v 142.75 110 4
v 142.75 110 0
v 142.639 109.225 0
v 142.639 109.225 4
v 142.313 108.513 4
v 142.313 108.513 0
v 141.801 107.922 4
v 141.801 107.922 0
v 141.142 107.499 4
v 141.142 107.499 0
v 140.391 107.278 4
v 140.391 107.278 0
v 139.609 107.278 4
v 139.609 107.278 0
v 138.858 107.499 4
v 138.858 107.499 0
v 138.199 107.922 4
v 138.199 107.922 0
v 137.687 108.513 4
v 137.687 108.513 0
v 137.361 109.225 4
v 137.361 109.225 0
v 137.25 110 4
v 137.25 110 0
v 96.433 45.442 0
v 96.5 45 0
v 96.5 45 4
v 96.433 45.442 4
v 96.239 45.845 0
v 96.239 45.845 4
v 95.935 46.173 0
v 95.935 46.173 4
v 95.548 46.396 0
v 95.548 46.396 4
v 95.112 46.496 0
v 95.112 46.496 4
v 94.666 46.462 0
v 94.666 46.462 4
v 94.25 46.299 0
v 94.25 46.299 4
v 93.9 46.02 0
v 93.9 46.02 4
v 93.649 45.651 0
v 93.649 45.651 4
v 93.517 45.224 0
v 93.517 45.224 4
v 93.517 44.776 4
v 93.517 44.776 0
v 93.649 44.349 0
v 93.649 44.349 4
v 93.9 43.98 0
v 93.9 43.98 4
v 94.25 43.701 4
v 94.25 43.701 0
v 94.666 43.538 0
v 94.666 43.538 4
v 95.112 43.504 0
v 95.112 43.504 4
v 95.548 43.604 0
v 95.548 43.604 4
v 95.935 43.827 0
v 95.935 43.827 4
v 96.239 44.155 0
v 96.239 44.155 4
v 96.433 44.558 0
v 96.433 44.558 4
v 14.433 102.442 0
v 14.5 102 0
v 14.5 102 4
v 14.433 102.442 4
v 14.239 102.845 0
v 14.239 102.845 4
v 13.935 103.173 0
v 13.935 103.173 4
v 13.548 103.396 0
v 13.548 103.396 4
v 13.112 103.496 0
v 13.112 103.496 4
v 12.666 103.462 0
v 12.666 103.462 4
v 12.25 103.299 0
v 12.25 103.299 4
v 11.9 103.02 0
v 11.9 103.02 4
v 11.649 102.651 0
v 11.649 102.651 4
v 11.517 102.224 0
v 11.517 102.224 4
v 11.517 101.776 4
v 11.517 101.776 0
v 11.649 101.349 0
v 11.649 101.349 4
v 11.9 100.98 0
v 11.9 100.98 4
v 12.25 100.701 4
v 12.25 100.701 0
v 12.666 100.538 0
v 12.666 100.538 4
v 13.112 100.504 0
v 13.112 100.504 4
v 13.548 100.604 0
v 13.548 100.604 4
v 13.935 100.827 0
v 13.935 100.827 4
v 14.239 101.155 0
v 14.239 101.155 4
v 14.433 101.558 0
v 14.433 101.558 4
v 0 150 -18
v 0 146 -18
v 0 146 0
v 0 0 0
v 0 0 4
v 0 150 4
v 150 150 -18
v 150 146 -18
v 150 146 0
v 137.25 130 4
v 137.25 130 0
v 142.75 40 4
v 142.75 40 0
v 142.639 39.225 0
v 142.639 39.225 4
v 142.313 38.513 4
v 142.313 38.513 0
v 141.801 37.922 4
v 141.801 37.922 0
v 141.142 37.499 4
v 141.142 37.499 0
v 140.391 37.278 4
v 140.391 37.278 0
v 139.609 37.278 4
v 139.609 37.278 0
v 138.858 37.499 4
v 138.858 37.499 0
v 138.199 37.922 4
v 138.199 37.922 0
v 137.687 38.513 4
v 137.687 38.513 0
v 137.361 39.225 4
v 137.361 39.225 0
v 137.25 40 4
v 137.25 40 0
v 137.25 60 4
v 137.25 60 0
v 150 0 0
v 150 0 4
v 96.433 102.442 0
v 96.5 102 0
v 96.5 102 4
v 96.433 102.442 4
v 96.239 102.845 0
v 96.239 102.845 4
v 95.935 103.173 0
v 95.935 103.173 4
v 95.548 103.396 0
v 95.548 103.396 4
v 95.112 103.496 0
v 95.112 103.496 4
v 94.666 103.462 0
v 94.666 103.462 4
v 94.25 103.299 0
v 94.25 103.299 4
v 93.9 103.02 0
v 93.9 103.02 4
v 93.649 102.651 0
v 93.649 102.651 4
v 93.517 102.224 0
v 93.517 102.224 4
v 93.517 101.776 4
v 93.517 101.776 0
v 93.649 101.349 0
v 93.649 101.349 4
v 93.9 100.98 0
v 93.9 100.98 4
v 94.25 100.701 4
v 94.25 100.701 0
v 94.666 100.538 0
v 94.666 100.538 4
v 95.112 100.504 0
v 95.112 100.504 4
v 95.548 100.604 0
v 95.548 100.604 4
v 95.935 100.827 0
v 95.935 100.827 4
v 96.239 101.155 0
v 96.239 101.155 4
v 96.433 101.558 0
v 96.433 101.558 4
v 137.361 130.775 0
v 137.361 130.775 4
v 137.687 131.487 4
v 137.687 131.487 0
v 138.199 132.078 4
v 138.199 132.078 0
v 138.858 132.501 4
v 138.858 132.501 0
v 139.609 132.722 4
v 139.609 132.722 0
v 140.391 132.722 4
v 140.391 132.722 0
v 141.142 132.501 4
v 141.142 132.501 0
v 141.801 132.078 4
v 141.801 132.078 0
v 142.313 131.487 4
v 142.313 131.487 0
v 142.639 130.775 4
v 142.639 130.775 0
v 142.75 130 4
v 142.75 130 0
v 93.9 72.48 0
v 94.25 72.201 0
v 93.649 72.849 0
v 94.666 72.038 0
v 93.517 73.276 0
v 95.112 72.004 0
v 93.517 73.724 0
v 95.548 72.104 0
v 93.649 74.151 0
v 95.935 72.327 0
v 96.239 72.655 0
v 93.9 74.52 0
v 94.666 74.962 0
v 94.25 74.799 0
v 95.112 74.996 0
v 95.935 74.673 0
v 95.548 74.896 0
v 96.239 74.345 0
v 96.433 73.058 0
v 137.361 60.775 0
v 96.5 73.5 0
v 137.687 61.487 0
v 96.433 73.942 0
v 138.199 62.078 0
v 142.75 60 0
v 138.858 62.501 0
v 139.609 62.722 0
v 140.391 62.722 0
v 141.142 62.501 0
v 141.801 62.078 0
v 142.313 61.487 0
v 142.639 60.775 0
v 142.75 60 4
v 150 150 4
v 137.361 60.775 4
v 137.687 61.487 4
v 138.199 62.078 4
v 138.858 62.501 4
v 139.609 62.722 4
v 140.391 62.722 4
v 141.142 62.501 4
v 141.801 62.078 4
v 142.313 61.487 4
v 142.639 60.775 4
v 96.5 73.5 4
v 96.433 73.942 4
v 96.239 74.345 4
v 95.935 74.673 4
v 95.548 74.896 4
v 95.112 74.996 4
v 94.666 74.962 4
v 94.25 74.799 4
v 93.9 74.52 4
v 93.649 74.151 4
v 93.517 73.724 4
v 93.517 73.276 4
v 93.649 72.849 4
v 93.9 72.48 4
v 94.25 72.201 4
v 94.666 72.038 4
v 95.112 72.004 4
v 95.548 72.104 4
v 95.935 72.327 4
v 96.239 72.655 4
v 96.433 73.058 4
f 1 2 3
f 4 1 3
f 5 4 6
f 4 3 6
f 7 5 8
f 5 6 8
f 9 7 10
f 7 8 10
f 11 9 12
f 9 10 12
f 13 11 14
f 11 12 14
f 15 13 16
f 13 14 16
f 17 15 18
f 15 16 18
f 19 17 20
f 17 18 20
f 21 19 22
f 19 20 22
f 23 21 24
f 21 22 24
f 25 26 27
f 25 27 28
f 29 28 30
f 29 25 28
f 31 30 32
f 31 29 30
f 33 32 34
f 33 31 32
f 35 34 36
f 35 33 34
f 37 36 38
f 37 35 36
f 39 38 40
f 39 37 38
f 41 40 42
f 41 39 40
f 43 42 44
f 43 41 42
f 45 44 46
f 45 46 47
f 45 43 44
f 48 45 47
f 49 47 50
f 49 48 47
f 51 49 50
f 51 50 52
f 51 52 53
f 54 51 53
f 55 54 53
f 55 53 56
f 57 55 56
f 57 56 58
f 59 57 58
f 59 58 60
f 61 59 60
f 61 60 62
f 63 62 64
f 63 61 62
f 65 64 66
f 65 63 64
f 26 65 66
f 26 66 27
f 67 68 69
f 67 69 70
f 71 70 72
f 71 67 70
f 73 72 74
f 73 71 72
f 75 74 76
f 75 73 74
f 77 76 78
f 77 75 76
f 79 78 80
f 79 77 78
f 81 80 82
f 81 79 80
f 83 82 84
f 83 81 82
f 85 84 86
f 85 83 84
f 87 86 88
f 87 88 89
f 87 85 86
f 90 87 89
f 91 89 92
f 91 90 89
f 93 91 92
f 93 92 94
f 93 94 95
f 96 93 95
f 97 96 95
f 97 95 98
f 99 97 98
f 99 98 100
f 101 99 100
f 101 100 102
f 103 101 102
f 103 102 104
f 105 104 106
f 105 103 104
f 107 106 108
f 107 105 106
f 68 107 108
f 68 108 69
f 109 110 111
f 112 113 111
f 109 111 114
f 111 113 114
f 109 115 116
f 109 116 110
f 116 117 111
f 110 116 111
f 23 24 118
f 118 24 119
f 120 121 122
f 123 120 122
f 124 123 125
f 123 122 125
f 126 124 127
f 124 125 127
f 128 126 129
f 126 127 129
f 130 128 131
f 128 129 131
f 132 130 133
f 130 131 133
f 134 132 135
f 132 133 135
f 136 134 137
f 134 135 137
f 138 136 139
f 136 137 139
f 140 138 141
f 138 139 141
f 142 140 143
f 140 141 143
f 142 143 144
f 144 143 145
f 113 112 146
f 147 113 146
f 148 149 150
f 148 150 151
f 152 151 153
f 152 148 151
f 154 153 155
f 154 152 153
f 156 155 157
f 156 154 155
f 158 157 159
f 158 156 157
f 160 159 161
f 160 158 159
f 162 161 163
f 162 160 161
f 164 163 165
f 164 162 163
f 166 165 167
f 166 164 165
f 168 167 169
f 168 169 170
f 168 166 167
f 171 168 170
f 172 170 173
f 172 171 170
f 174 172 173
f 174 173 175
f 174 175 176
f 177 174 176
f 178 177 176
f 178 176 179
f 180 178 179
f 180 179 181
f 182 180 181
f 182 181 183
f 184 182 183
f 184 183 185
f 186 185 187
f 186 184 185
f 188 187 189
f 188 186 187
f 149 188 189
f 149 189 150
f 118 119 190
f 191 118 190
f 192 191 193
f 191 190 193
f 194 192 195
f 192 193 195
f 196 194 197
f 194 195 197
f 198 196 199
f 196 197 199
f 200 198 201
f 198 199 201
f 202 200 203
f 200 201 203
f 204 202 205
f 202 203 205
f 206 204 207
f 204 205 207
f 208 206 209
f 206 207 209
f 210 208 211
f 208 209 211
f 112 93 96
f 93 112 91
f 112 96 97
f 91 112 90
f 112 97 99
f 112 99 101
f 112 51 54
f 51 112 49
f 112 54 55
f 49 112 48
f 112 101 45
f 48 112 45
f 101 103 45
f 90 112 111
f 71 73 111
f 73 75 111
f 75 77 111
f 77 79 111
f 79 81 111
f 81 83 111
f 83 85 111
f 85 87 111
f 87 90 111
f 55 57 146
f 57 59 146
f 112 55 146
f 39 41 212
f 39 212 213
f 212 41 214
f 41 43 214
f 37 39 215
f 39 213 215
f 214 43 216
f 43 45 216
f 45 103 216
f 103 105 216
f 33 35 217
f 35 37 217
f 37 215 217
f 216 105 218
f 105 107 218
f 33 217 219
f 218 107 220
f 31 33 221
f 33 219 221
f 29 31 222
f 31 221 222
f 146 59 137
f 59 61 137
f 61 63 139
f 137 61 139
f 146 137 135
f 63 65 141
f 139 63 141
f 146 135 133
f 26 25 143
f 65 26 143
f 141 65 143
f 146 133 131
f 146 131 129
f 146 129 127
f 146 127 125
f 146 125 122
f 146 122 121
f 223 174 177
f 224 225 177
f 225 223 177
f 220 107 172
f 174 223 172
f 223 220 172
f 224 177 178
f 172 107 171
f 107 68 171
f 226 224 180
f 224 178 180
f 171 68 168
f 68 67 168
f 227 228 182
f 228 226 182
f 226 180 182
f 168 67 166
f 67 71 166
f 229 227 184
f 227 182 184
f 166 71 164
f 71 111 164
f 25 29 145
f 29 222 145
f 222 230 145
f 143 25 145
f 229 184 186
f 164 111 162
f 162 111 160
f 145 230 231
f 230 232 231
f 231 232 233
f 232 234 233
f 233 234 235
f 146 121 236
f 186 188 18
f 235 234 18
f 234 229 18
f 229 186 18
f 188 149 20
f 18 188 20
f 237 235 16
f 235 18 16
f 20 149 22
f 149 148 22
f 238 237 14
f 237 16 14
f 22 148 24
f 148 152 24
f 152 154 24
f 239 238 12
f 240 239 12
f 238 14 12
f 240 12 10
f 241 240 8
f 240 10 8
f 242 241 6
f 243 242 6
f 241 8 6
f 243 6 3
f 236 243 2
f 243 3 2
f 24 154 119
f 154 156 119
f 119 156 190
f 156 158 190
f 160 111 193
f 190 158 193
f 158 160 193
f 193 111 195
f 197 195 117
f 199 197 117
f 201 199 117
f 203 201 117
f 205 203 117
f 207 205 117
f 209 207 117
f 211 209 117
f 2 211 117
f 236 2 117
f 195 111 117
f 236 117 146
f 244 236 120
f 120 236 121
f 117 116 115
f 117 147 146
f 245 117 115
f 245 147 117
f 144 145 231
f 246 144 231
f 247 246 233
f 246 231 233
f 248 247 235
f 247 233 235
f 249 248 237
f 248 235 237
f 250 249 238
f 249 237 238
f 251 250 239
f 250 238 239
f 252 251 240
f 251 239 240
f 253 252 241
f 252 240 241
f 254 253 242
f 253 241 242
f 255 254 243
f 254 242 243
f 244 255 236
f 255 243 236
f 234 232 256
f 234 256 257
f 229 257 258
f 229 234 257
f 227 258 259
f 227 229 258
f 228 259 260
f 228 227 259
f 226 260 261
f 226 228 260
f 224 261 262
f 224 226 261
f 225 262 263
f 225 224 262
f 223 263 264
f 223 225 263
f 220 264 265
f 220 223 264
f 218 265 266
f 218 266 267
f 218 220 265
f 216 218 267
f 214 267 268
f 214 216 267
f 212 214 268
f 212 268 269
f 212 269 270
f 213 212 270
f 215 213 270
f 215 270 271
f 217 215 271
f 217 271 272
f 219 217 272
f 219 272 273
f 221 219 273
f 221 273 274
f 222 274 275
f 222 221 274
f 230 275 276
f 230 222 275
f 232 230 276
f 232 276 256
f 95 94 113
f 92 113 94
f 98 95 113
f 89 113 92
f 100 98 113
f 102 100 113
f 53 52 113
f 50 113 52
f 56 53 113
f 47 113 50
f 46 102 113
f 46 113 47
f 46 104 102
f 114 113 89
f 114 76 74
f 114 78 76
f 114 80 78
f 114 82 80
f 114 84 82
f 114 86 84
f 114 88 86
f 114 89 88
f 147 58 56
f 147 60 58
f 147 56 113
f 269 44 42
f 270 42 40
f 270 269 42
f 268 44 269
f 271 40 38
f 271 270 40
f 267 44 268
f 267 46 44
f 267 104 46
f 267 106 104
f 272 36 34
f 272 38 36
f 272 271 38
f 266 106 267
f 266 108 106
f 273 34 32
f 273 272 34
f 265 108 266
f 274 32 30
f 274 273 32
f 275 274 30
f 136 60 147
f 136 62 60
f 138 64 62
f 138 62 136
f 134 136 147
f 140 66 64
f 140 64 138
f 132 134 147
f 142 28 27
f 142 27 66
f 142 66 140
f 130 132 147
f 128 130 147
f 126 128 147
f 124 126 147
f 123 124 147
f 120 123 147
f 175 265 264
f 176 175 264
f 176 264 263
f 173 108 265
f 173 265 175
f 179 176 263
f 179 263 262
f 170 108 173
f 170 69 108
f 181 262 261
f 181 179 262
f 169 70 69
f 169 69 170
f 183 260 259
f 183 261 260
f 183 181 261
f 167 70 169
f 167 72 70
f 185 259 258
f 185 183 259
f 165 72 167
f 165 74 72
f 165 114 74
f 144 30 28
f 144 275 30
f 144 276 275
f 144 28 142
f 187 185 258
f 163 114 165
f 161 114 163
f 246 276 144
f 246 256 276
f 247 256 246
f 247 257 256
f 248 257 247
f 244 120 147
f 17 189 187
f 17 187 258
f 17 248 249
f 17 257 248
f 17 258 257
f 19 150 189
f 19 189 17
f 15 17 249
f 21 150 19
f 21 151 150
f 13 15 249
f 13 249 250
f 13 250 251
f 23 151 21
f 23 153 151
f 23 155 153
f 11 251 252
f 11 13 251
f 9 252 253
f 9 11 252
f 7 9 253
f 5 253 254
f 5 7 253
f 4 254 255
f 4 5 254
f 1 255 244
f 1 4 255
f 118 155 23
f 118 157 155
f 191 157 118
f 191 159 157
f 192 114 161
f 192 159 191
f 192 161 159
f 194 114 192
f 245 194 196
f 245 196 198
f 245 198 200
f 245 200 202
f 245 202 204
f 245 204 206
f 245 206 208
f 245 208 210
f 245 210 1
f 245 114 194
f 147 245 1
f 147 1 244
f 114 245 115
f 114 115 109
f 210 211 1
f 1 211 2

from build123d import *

# Parameters (mm, degrees)
SKETCH_1_W      = 150
SKETCH_1_H      = 150
SKETCH_1_R      = 1.5
EXTRUDE_1_DEPTH = 4
SKETCH_2_W      = 150
SKETCH_2_H      = 4
EXTRUDE_2_DEPTH = 18


with BuildPart() as part:
    # 草图1 → 凸台-拉伸1 (new body)
    with BuildSketch(Plane.XY):
        with Locations((75, 75)):
            Rectangle(SKETCH_1_W, SKETCH_1_H)
        with Locations((95, 102)):
            Circle(SKETCH_1_R, mode=Mode.SUBTRACT)
        with Locations((95, 45)):
            Circle(SKETCH_1_R, mode=Mode.SUBTRACT)
        with Locations((95, 73.5)):
            Circle(SKETCH_1_R, mode=Mode.SUBTRACT)
        with Locations((13, 102)):
            Circle(SKETCH_1_R, mode=Mode.SUBTRACT)
        with BuildLine():
            Line((142.75, 130), (142.75, 110))
            ThreePointArc((142.75, 110), (140, 107.25), (137.25, 110))
            Line((137.25, 110), (137.25, 130))
            ThreePointArc((137.25, 130), (140, 132.75), (142.75, 130))
        make_face(mode=Mode.SUBTRACT)
        with BuildLine():
            Line((142.75, 60), (142.75, 40))
            ThreePointArc((142.75, 40), (140, 37.25), (137.25, 40))
            Line((137.25, 40), (137.25, 60))
            ThreePointArc((137.25, 60), (140, 62.75), (142.75, 60))
        make_face(mode=Mode.SUBTRACT)
    extrude(amount=EXTRUDE_1_DEPTH)

    # 草图2 → 凸台-拉伸2 (add)
    with BuildSketch(Plane(origin=(0, 0, 0), x_dir=(-1, 0, 0), z_dir=(0, 0, -1))):
        with Locations((-75, 148)):
            Rectangle(SKETCH_2_W, SKETCH_2_H)
    extrude(amount=EXTRUDE_2_DEPTH)


solid = part.part
